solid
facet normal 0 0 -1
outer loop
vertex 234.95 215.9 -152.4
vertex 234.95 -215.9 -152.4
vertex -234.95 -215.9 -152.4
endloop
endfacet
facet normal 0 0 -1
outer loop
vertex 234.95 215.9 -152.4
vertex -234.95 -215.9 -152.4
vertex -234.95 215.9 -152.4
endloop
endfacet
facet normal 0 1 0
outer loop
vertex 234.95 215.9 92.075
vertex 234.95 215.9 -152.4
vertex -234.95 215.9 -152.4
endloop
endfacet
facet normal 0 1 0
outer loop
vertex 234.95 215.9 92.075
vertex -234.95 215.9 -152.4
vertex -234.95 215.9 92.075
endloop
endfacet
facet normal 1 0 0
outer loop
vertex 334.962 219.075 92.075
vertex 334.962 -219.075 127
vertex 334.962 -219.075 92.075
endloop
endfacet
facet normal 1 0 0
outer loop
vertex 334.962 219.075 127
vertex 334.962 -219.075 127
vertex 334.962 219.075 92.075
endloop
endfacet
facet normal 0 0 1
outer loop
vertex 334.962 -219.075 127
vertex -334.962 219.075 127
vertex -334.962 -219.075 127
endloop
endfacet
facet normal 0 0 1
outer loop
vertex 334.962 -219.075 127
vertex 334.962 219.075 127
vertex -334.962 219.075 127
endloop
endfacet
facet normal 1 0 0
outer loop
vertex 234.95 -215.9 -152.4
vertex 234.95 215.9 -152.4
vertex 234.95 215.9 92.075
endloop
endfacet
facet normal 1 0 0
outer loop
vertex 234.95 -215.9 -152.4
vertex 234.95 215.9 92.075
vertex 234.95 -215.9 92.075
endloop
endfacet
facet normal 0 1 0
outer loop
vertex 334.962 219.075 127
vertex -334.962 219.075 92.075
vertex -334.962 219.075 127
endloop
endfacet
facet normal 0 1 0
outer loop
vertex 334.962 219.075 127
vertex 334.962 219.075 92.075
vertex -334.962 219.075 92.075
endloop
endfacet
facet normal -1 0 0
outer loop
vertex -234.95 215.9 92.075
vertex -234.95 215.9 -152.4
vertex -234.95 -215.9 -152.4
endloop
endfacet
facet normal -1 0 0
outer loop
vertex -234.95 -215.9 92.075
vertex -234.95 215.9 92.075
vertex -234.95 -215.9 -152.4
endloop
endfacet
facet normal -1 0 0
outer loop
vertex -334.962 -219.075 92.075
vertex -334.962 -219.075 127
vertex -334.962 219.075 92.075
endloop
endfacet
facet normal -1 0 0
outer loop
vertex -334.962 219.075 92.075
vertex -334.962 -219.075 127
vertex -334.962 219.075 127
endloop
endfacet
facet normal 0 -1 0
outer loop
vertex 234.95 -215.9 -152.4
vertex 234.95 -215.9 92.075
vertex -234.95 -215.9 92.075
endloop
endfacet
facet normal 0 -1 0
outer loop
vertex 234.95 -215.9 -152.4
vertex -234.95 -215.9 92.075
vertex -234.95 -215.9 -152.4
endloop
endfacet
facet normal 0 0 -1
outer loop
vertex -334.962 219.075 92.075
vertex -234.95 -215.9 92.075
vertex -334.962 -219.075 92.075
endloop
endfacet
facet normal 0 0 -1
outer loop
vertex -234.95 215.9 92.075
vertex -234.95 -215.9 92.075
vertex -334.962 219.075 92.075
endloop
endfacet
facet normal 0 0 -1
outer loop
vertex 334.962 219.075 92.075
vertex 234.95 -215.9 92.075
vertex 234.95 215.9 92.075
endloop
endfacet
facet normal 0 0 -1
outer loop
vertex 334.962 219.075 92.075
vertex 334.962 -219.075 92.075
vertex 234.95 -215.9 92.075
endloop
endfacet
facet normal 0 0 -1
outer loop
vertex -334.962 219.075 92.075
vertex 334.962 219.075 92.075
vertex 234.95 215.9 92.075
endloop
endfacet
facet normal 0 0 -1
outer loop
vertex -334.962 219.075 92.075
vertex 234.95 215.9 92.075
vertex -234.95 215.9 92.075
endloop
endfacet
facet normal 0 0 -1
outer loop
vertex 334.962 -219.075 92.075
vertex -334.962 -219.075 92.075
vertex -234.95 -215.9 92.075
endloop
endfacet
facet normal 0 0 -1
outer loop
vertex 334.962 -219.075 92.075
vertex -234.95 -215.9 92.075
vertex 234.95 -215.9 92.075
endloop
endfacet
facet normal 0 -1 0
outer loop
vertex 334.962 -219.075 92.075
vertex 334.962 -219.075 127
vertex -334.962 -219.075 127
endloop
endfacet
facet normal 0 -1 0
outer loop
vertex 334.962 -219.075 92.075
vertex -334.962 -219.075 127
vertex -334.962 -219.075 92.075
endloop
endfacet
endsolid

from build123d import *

# Parameters (mm, degrees)
F1_DEPTH      = 334.9625
F1_DEPTH_BACK = 334.9625
F2_W          = 100.0125
F2_H          = 431.8
F3_DEPTH      = 244.475


# Not quite as in the source:
# - a length typed as a fraction of an inch, garbled in the dataset ("3 / 203.2 mm" for 3/8 in), is restored


with BuildPart() as f1:
    # F0 (on Right) → F1 (new body, two sides)
    with BuildSketch(Plane.YZ) as f1_sk:
        Polygon((219.075, 127), (-219.075, 127), (-219.075, 92.075), (-215.9, 92.075), (-215.9, -152.4), (215.9, -152.4), (215.9, 92.075), (219.075, 92.075), align=None)
    extrude(amount=F1_DEPTH)
    extrude(f1_sk.sketch, amount=-F1_DEPTH_BACK)

    # F2 (on face) → F3 (cut, through all)
    with BuildSketch(Plane(origin=(0, 0, -152.4), x_dir=(1, 0, 0), z_dir=(0, 0, -1))):
        with Locations((-284.95625, 0)):
            Rectangle(F2_W, F2_H)
        with Locations((284.95625, 0)):
            Rectangle(F2_W, F2_H)
    extrude(amount=-F3_DEPTH, mode=Mode.SUBTRACT)


solid = f1.part
